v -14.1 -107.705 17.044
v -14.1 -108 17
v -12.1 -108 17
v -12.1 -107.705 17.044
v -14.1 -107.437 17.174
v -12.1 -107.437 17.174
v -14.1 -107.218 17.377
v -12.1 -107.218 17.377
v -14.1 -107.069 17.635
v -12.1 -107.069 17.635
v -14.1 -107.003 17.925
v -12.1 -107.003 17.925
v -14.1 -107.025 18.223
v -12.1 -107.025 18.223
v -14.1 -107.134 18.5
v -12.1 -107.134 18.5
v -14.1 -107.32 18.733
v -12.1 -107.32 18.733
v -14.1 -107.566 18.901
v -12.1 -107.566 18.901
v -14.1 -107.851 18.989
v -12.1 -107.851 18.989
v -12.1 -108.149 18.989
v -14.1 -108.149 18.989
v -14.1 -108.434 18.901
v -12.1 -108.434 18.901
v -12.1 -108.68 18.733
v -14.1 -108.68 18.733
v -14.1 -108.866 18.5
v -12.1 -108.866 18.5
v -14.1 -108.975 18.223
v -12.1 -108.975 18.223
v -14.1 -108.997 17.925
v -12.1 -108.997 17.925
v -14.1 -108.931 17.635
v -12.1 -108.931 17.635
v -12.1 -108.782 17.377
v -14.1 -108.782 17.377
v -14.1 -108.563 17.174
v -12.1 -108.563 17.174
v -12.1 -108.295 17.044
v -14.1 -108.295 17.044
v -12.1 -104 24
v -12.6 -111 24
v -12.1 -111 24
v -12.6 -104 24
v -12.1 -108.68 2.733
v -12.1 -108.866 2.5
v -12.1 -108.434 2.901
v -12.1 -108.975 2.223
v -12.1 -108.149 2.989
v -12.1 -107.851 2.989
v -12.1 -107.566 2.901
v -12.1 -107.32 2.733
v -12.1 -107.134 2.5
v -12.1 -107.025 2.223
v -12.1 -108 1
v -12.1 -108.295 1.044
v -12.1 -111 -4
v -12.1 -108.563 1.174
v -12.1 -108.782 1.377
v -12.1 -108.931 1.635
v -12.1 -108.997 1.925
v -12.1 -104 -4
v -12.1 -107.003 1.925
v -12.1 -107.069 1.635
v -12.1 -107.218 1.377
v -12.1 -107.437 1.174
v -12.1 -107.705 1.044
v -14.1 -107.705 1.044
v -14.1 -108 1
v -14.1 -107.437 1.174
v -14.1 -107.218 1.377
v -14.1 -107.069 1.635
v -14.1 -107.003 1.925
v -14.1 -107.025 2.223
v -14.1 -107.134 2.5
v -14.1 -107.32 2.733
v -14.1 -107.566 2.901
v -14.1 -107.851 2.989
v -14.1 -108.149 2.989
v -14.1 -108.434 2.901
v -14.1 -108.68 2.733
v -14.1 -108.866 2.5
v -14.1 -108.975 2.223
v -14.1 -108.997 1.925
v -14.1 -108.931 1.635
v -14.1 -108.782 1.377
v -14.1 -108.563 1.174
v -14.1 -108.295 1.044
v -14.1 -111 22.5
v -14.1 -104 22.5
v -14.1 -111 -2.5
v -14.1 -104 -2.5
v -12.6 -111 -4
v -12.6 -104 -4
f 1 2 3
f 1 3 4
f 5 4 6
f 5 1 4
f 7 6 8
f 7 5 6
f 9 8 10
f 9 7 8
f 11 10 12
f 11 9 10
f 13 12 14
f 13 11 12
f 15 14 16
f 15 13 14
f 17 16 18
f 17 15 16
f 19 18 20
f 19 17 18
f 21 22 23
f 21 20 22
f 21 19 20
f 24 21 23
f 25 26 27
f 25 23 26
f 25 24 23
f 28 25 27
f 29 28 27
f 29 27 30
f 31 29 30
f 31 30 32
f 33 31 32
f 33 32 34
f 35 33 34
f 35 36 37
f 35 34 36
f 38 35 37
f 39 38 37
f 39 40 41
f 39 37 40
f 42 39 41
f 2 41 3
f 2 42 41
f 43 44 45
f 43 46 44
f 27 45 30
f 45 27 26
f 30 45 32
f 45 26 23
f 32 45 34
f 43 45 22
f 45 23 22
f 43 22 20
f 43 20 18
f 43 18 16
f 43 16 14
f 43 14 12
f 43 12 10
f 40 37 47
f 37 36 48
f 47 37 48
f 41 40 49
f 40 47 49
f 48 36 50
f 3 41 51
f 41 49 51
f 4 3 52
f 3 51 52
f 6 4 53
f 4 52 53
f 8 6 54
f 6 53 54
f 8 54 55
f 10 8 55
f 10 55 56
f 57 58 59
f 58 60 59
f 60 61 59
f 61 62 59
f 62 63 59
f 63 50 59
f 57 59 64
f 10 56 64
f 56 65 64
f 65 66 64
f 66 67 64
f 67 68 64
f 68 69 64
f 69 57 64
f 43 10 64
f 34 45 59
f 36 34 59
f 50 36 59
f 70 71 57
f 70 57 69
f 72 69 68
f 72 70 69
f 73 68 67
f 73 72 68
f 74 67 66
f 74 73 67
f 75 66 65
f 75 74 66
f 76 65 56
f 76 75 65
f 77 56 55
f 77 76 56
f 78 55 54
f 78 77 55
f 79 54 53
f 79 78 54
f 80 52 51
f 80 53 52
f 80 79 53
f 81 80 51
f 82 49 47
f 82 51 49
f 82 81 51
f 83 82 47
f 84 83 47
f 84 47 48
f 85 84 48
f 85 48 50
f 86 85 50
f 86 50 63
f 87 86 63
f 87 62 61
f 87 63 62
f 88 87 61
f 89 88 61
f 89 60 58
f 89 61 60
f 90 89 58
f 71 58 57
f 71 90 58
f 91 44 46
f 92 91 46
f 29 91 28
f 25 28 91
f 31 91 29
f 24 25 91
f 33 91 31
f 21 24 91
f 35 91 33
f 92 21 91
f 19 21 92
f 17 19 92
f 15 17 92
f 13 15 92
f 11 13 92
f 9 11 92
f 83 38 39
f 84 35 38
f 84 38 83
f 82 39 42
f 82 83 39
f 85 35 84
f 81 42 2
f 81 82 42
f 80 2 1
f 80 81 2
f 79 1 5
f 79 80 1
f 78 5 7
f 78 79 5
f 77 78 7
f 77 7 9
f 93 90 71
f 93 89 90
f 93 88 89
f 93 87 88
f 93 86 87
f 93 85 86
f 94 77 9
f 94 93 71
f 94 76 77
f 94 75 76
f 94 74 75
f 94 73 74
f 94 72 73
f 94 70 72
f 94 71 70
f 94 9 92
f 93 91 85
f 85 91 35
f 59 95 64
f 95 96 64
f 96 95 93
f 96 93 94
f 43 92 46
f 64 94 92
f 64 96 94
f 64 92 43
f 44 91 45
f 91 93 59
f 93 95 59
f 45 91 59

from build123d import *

# Parameters (mm, degrees)
CYLINDER2204_R     = 1
CYLINDER2204_DEPTH = 20
CYLINDER2203_R     = 1
CYLINDER2203_DEPTH = 20
BOX850_W           = 2
BOX850_H           = 7
BOX850_DEPTH       = 28
CHAMFER069_SIZE    = 1.5


with BuildPart() as v_lec2204:
    # Cylinder2204 → Cylinder2204 (new body)
    with BuildSketch(Plane(origin=(-17, -108, 18), x_dir=(0, 0, -1), z_dir=(1, 0, 0))):
        Circle(CYLINDER2204_R)
    extrude(amount=CYLINDER2204_DEPTH)


with BuildPart() as compound986:
    # Cylinder2203 → Cylinder2203 (new body)
    with BuildSketch(Plane(origin=(-17, -108, 2), x_dir=(0, 0, -1), z_dir=(1, 0, 0))):
        Circle(CYLINDER2203_R)
    extrude(amount=CYLINDER2203_DEPTH)

    # Compound986: union Válec2204
    add(v_lec2204.part)


with BuildPart() as chamfer069:
    # Box850 → Box850 (new body)
    with BuildSketch(Plane(origin=(-14.1, -111, -4), x_dir=(1, 0, 0), z_dir=(0, 0, 1))):
        with Locations((1, 3.5)):
            Rectangle(BOX850_W, BOX850_H)
    extrude(amount=BOX850_DEPTH)

    # Cut811: cut Compound986
    add(compound986.part, mode=Mode.SUBTRACT)

    # Chamfer069
    chamfer069_edges = [chamfer069.edges().sort_by_distance(p)[0] for p in [
        (-14.1, -107.5, 24),
        (-14.1, -107.5, -4),
    ]]
    chamfer(chamfer069_edges, length=CHAMFER069_SIZE)


solid = chamfer069.part
